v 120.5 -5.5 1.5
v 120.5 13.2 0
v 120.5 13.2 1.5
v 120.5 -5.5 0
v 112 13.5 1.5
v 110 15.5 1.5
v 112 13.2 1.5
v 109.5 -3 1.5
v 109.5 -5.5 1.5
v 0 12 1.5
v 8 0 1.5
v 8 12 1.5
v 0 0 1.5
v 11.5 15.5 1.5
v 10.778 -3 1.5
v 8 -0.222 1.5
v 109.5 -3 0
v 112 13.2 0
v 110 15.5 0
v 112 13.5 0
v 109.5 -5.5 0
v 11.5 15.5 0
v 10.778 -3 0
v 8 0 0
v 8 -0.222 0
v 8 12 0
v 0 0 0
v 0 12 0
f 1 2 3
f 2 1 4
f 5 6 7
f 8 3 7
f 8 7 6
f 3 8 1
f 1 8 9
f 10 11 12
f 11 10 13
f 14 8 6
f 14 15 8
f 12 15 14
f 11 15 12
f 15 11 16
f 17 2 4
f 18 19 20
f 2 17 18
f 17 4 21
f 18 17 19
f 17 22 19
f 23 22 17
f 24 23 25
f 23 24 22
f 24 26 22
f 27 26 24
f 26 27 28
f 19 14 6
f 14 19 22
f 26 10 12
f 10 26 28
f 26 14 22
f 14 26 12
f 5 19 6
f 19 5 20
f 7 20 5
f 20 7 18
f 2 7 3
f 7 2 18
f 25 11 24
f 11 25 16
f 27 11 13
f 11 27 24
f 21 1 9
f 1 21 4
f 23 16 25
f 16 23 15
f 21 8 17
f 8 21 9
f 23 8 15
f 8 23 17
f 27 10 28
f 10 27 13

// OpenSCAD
height = 1.5;

module pci() {
	cube([120.5, 12, height]);	

	difference() {
		translate([8, 12, 0])
			cube([112.5, 3.5, height]);
		translate([8, 12, -0.5])
			rotate([0, 0, 45])
				cube([5, 3.5, height * 2]);
		translate([112, 13.5, -0.5])
			rotate([0, 0, 45])
				cube([3.2, 3.2, height * 2]);
		translate([112, 13.2, -0.5])
				cube([8.5 + 1, 2.4, height * 2]);
	}
	
	difference() {
		translate([8, -5.5, 0])
			cube([112.5, 5.5, height]);
		
		rotate([0, 0, -45])
			translate([5.6, -2.5, -0.5])
				cube([8, 8, height * 2]);

		translate([8, -5.5, -0.5])
				cube([101.5, 2.5, height * 2]);
	}
}

module hdmi() {
	translate([0, 6 + 8.5, 0])
		cylinder(r=1.5, h=height * 2, $fn=20, center=true);
	cube([8, 17, height * 2], center=true);
	translate([0, -(6 + 8.5), 0])
		cylinder(r=1.5, h=height * 2, $fn=20, center=true);
}

//hdmi();
//translate([0, 50, 0])
//	hdmi();
pci();
